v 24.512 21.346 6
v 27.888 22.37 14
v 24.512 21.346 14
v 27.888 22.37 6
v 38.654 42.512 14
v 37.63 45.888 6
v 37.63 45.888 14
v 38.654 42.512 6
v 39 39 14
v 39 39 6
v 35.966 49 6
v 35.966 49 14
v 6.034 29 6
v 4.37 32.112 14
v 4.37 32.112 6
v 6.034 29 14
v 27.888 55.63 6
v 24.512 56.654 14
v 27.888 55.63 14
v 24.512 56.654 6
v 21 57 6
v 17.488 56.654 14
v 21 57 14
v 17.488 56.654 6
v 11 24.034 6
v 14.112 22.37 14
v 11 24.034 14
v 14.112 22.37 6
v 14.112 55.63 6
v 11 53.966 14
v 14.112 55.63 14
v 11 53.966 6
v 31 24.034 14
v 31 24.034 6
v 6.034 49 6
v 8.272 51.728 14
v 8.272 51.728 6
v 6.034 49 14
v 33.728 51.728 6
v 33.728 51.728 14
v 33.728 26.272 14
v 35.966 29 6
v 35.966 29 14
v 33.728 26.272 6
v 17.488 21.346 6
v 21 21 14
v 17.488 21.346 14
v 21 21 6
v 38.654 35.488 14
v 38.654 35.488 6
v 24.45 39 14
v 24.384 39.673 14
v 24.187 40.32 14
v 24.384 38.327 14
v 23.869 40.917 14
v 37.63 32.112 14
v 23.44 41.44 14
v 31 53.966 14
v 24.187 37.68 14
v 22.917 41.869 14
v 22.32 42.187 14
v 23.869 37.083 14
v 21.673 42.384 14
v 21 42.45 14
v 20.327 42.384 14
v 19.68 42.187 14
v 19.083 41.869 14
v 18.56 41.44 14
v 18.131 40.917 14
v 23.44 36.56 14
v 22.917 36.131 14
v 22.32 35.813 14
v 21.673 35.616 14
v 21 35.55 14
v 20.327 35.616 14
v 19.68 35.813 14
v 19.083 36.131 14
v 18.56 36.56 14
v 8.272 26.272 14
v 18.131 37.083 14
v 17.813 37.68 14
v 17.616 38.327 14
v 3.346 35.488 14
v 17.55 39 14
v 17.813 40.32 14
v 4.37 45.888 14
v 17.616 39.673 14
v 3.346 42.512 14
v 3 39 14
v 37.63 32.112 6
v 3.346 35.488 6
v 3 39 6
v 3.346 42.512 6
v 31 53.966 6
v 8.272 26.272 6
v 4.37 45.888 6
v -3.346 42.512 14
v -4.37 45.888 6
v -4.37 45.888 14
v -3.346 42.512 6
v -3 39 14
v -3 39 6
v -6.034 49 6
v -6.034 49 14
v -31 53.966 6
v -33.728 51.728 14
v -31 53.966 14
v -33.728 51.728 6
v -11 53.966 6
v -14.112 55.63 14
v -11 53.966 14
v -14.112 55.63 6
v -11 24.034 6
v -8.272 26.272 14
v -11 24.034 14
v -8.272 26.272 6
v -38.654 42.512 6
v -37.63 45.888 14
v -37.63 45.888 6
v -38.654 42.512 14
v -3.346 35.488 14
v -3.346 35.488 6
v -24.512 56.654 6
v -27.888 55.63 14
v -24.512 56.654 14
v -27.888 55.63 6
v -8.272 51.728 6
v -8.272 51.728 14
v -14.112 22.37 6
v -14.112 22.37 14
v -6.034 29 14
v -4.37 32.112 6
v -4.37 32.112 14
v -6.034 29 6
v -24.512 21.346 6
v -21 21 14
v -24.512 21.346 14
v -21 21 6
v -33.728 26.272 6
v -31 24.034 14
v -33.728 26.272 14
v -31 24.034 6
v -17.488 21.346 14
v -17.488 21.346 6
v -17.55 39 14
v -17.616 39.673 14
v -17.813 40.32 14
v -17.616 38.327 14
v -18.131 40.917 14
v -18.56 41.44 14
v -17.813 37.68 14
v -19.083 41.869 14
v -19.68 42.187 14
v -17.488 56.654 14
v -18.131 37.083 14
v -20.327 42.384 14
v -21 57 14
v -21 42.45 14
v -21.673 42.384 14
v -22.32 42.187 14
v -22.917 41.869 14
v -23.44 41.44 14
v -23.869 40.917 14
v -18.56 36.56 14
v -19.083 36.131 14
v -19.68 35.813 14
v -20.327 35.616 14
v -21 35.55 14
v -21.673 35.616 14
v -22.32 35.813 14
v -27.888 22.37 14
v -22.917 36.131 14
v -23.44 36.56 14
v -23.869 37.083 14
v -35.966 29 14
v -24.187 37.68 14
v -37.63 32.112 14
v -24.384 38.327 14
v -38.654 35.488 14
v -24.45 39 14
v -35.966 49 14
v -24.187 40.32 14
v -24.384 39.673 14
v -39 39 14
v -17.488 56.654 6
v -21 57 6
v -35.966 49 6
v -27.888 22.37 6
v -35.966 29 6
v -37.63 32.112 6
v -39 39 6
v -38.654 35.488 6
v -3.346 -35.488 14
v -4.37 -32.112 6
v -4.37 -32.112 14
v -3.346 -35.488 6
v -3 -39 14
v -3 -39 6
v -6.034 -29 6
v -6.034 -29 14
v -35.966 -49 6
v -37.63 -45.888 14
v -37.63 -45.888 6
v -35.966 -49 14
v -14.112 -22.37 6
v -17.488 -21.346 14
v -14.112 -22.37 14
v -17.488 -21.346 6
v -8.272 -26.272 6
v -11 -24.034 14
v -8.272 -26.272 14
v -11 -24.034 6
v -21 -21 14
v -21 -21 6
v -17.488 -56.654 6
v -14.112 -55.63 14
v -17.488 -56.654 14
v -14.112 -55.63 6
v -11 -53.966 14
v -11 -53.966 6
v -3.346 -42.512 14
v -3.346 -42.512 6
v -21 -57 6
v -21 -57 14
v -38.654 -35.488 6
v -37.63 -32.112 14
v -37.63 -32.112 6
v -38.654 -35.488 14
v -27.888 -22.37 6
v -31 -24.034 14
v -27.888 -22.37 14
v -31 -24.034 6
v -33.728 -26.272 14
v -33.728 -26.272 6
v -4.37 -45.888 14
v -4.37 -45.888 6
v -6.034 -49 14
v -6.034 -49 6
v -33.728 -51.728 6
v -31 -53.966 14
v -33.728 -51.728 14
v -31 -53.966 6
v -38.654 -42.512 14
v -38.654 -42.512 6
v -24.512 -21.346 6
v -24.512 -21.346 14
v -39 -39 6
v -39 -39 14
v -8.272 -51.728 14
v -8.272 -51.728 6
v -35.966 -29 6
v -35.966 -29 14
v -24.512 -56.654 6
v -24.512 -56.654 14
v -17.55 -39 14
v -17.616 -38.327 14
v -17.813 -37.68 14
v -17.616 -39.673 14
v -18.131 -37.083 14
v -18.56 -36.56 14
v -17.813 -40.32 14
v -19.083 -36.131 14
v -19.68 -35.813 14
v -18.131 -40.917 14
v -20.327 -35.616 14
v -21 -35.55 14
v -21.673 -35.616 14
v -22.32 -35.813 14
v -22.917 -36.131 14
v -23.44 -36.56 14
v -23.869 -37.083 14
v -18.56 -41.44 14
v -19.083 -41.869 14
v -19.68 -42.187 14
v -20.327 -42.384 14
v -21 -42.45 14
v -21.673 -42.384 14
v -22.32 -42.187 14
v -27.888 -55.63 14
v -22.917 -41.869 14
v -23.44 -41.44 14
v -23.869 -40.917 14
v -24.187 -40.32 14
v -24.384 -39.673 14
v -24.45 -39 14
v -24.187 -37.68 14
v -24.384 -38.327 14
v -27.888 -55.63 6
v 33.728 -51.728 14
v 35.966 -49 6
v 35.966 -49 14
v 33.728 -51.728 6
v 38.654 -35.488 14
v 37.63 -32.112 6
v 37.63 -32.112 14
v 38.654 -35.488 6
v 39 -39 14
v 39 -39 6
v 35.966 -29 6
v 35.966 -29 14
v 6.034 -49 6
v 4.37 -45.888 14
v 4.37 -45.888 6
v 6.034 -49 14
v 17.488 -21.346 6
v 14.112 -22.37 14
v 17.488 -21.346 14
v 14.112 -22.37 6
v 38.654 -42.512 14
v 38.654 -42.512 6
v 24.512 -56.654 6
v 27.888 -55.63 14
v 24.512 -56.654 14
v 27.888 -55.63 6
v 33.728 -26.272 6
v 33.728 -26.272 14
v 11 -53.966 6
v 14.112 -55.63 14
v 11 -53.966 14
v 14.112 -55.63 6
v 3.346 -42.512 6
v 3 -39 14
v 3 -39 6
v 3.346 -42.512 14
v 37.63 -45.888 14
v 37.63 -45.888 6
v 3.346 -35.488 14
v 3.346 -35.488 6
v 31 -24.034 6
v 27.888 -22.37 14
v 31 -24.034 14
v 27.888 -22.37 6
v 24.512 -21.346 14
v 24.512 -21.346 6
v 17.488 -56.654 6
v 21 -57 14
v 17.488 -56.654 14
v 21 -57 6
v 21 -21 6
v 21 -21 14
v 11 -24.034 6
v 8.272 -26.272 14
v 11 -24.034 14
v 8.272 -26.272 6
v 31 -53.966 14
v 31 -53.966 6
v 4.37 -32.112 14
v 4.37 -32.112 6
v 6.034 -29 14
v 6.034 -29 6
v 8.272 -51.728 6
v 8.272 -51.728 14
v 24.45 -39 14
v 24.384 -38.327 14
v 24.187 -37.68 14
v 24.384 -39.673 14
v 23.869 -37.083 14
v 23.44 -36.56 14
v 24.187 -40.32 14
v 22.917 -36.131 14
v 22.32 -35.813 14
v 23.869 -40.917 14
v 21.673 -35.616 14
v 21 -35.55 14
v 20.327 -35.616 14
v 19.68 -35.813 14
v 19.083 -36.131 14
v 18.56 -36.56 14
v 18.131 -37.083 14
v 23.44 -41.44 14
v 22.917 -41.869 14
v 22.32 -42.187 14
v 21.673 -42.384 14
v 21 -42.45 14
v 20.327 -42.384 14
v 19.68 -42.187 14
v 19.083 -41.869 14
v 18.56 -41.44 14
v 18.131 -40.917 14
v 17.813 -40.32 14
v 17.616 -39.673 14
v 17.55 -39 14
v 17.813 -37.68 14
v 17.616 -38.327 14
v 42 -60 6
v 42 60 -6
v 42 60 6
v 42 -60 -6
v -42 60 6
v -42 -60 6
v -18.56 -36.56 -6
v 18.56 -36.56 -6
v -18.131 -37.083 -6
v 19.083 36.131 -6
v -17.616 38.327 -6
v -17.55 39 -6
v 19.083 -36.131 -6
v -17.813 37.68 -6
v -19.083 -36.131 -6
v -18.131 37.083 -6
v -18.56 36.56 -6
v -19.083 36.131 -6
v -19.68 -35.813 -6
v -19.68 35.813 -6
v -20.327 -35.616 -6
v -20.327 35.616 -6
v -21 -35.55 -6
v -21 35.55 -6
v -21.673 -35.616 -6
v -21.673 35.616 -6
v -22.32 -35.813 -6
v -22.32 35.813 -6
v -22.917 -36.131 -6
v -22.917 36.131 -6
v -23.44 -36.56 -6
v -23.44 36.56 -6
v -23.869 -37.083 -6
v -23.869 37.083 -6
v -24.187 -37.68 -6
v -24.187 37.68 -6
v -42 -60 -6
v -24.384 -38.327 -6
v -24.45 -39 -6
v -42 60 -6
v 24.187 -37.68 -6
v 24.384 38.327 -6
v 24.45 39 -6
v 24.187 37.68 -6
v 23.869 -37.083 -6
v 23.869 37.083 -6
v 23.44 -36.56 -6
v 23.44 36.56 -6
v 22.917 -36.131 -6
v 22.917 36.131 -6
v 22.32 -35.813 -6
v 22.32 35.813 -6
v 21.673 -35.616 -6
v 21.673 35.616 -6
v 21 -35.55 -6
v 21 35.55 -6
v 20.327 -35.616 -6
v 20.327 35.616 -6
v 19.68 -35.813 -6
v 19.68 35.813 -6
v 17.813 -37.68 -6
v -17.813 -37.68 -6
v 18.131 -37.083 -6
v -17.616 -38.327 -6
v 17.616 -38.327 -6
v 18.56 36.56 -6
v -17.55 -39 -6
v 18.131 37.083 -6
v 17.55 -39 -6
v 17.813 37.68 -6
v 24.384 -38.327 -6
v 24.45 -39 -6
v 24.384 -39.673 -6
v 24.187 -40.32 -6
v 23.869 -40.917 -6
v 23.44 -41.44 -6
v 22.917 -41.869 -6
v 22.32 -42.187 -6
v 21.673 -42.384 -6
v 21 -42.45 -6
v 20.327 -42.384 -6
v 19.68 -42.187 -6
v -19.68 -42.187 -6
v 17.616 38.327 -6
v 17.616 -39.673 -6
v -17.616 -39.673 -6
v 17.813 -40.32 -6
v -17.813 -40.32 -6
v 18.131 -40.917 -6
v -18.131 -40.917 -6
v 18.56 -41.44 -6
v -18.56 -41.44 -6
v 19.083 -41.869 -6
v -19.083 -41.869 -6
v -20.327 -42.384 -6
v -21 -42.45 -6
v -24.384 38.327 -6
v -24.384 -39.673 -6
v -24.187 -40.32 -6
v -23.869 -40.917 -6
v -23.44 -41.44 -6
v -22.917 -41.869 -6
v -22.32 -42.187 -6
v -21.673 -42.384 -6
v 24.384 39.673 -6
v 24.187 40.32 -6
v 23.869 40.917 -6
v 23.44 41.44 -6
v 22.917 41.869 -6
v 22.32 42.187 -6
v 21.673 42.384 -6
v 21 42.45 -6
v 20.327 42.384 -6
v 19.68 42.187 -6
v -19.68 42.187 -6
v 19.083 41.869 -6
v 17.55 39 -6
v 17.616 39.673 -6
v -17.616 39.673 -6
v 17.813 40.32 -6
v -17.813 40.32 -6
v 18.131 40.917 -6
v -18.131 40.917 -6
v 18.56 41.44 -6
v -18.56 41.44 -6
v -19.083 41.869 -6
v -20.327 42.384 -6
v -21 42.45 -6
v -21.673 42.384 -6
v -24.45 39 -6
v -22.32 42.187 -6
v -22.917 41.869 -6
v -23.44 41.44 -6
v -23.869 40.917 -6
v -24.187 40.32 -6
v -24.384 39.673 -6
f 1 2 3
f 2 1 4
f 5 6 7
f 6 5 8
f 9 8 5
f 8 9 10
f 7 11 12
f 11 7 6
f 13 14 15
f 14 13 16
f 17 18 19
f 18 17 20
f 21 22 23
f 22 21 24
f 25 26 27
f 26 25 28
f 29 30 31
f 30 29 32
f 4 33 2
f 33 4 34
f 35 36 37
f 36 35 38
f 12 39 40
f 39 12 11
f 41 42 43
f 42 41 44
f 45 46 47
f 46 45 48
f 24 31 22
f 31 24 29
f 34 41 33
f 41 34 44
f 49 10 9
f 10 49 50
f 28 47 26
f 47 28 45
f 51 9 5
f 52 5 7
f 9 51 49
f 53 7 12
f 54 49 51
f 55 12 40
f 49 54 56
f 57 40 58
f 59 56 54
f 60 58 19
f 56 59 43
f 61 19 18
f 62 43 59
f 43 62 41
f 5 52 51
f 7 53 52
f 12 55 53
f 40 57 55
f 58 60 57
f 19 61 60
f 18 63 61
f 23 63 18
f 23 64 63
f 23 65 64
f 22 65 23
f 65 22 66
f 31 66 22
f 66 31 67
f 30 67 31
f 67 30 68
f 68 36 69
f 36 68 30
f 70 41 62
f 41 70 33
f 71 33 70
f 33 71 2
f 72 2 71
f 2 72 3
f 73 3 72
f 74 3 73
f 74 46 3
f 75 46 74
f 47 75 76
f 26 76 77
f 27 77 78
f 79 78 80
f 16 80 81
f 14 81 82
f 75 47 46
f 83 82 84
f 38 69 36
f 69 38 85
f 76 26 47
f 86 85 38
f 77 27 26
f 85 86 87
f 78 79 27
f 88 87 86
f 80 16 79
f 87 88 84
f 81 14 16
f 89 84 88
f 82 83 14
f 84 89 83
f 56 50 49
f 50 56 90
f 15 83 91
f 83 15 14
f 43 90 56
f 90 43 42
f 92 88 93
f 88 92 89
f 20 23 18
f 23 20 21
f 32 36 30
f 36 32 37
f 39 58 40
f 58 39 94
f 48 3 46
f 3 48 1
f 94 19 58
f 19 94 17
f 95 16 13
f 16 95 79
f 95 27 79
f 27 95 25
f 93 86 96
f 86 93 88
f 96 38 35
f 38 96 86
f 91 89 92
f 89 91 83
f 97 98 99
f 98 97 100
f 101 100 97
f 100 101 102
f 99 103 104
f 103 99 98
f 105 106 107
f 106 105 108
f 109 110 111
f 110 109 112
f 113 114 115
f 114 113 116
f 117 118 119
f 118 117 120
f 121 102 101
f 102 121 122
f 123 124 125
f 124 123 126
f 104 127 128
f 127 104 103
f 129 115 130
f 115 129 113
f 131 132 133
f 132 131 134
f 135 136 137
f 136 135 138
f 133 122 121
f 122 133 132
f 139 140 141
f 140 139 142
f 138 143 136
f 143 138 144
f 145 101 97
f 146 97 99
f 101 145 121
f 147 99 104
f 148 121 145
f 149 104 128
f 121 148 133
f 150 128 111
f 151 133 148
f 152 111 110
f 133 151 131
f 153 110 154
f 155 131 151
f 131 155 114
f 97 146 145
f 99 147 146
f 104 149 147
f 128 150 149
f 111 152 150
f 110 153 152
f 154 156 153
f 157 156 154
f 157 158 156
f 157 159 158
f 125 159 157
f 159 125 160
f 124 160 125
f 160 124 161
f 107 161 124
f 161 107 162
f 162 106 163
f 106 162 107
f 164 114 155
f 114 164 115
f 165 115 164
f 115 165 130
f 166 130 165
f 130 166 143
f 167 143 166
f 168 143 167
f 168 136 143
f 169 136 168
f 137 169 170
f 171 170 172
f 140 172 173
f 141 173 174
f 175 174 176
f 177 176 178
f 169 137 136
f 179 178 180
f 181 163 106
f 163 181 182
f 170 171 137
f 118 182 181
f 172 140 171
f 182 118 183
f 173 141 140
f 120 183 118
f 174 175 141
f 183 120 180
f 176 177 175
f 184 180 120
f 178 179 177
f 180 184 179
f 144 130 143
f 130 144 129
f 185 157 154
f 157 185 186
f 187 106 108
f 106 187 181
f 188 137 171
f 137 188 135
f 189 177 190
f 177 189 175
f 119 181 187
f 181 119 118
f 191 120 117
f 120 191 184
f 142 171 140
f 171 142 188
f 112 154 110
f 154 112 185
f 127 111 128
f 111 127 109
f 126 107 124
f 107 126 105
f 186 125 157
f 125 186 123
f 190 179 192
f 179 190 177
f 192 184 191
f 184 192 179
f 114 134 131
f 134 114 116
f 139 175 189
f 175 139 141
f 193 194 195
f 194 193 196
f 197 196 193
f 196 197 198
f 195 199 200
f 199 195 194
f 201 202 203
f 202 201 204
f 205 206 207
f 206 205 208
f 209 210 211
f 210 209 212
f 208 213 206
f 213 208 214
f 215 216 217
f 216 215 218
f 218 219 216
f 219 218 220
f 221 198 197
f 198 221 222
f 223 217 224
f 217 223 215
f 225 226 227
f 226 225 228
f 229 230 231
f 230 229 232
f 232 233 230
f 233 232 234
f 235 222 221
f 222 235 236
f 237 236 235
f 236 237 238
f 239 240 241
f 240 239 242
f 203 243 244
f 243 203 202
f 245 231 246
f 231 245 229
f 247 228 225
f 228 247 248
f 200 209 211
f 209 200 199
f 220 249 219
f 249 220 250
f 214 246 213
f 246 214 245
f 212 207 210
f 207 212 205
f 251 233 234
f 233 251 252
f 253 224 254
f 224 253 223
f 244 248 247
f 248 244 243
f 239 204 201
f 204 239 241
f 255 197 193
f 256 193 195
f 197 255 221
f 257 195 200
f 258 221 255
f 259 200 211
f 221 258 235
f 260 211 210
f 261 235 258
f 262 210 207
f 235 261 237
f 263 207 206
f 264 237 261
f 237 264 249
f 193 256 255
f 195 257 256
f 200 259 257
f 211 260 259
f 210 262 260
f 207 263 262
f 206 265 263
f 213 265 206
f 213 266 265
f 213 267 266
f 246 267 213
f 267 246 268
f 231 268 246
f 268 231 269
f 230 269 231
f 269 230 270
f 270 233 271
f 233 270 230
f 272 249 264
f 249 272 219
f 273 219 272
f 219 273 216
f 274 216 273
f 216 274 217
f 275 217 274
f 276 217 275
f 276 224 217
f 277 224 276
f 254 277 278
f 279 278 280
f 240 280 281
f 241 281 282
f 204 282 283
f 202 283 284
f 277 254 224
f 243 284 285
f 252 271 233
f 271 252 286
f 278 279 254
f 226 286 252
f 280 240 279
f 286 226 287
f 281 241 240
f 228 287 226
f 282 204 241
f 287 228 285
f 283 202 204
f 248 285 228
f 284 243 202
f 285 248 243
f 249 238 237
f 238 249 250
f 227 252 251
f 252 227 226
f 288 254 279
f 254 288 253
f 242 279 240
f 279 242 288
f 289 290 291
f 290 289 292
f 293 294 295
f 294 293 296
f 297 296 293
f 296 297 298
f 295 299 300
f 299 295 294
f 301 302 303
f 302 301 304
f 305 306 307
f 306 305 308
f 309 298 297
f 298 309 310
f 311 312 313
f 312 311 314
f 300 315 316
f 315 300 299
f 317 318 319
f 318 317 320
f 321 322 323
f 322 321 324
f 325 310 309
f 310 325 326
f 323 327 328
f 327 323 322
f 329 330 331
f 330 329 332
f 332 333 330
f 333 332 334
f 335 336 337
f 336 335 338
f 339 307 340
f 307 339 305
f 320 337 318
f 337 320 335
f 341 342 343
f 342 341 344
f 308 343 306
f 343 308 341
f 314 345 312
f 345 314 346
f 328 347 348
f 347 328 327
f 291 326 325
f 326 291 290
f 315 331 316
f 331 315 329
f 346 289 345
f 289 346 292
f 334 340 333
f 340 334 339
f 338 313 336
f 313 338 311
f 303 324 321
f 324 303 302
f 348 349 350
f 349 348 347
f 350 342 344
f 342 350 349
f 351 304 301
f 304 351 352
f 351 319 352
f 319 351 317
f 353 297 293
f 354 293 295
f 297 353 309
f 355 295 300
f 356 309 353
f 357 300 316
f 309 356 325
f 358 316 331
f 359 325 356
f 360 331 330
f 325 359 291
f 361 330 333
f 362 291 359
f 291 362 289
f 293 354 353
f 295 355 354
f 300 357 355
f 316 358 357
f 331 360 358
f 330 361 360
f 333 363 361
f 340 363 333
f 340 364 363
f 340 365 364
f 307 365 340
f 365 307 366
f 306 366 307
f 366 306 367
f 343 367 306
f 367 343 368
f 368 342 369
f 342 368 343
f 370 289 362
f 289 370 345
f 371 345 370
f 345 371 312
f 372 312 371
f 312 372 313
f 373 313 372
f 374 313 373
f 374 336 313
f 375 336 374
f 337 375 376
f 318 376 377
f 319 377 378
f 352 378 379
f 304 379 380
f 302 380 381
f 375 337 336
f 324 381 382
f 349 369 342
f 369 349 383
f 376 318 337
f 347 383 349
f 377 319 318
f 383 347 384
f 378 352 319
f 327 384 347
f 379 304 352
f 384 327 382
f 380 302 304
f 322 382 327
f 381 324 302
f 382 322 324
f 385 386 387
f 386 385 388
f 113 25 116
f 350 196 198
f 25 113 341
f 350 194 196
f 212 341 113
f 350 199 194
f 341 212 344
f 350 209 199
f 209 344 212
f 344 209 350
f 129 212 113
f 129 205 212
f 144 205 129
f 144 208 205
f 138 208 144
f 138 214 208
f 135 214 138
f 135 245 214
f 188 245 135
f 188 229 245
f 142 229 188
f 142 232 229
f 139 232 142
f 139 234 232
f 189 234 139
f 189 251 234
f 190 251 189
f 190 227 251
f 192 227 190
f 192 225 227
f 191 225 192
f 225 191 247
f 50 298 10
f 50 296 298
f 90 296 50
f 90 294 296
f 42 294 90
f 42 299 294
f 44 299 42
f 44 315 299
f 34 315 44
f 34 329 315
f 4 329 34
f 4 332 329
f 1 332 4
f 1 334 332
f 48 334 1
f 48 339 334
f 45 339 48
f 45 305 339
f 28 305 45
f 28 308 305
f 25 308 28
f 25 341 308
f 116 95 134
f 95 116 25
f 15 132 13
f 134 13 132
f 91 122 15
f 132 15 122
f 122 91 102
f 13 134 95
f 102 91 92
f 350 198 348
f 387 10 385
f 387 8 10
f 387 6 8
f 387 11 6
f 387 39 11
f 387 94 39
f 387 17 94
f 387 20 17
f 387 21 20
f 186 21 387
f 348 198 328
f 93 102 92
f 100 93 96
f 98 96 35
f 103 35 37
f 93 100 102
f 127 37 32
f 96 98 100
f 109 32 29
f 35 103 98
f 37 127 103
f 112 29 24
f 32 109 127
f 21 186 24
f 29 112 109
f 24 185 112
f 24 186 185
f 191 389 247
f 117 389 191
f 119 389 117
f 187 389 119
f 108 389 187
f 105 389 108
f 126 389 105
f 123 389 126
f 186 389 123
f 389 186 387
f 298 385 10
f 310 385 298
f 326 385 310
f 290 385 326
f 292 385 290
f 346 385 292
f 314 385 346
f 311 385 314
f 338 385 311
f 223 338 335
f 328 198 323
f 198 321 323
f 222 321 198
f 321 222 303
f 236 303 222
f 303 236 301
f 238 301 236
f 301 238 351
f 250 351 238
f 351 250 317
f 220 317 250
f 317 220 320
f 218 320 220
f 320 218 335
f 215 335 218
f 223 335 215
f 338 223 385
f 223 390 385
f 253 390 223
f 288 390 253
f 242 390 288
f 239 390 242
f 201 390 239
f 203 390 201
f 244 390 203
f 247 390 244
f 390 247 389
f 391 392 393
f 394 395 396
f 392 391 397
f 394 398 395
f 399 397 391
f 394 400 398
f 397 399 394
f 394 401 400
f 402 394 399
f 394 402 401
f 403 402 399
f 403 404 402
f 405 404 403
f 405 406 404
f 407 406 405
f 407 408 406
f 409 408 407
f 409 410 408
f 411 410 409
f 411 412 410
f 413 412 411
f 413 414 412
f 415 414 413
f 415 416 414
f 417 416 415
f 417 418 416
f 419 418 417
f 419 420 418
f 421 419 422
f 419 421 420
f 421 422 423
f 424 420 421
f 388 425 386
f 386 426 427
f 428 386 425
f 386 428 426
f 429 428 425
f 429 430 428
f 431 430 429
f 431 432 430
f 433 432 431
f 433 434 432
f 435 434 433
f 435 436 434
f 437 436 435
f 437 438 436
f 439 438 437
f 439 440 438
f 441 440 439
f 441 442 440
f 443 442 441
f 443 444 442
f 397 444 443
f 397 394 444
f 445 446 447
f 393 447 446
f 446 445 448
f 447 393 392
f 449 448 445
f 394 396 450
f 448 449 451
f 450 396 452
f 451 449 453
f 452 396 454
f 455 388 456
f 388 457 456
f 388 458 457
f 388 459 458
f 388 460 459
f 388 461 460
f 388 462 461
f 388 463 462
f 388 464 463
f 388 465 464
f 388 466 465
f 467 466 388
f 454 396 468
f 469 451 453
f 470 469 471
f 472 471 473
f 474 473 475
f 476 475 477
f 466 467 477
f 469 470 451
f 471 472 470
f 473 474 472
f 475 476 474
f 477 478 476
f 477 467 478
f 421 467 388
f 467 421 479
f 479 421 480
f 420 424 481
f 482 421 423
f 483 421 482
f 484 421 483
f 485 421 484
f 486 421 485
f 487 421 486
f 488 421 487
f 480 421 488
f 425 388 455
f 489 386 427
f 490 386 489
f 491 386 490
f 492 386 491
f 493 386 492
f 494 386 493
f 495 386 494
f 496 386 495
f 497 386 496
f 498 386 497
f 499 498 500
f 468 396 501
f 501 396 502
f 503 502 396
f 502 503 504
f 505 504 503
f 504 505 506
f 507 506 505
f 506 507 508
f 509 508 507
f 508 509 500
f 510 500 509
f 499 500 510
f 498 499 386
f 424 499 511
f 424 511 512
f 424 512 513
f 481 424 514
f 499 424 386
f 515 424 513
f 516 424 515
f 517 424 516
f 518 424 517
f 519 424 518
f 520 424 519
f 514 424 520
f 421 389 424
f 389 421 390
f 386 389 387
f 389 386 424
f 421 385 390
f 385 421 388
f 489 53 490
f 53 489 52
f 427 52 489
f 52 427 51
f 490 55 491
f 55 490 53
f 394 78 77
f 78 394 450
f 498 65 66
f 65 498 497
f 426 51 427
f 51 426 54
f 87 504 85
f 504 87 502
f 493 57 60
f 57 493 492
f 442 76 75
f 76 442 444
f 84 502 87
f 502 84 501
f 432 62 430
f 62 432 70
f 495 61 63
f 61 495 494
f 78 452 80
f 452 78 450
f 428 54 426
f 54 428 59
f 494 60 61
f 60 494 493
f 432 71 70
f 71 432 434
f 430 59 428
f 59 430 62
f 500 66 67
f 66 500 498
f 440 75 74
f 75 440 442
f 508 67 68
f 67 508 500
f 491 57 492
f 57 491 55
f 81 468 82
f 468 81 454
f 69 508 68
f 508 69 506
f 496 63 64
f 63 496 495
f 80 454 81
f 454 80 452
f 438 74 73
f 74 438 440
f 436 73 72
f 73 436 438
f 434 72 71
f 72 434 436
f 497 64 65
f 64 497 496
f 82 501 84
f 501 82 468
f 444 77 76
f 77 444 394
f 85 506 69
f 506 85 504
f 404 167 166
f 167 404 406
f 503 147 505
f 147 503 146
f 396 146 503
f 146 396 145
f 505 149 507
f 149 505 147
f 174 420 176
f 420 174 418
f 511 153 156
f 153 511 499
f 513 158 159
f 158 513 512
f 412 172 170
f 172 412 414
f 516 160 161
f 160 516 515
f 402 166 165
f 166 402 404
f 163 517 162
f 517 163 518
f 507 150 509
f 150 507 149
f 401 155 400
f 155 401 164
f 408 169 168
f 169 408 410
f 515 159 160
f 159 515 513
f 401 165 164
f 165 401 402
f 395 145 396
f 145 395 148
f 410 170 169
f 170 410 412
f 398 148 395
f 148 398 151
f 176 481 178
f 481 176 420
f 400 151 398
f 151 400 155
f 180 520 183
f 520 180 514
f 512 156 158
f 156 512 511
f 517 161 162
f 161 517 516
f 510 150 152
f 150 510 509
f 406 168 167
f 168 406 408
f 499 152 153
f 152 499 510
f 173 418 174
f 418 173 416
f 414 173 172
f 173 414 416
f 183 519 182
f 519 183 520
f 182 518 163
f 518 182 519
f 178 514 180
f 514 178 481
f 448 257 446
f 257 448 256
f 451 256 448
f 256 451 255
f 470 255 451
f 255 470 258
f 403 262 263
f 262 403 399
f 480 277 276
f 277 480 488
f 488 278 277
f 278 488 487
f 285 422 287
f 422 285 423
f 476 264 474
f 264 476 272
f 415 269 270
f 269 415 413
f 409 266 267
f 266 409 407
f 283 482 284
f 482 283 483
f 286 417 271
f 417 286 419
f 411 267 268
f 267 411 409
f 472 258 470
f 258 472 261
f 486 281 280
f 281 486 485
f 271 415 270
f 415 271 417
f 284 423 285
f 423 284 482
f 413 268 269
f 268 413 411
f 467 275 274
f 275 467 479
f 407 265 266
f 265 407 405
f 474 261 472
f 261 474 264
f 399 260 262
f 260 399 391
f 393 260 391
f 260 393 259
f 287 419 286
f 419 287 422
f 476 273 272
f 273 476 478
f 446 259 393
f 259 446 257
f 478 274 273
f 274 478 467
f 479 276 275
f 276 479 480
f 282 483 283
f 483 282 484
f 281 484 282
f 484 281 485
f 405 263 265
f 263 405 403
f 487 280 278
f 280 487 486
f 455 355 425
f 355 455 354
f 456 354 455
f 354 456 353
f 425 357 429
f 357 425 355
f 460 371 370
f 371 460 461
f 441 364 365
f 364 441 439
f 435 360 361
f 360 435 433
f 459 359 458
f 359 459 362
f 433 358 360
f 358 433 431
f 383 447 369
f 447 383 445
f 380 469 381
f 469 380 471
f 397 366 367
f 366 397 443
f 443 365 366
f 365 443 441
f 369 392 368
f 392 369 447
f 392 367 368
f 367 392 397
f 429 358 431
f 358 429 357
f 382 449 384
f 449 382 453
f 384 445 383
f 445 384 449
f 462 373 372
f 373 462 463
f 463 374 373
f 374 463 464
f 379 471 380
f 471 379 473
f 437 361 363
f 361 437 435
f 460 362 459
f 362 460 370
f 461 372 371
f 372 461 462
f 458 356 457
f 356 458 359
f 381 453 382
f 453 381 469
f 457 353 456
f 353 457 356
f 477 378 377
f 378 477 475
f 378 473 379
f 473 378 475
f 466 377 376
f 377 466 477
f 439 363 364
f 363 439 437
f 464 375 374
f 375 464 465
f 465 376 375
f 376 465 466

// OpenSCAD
$fn = 32;

// ----------------------------------------------------------------------
// Anchor pads 84 x 120 x 20
// four corner bosses with anchor holes
// ----------------------------------------------------------------------

// --- parameters (mm) ---
plate = [84, 120, 12];  // base plate size (x, y, z)
seat_tol = 0.1;         // tolerance at the seating features
free_tol = 0.5;         // general tolerance on the free sizes
pads = 4;               // boss count, one per corner
edge = 21;              // boss centre offset from the plate edge
boss_d = 36;            // boss diameter
boss_h = 8;             // boss height above the base plate
bore_d = 6.6;           // nominal hole diameter from the drawing
print_allowance = 0.3;  // clearance added for printing

// --- derived feature positions (mm) ---
hole_d = bore_d + print_allowance;  // = 6.9   hole diameter as printed
height = plate[2] + boss_h;         // = 20   overall height of the part
corner_x = plate[0] / 2 - edge;     // = 21   boss centre X
corner_y = plate[1] / 2 - edge;     // = 39   boss centre Y
feature_centers = [
  [corner_x, corner_y],
  [-corner_x, corner_y],
  [-corner_x, -corner_y],
  [corner_x, -corner_y]
];   // boss centres, anchor holes are drilled there

// base plate, four bosses standing on it, anchor holes all the way through
difference() {
  union() {
    cube(plate, center = true);
    for (centre = feature_centers)
      translate([centre[0], centre[1], plate[2] / 2 - 1])
        cylinder(d = boss_d, h = boss_h + 1);
  }
  for (centre = feature_centers)
    translate([centre[0], centre[1], -height])
      cylinder(d = hole_d, h = 2 * height + 2);  // through boss and plate
}
